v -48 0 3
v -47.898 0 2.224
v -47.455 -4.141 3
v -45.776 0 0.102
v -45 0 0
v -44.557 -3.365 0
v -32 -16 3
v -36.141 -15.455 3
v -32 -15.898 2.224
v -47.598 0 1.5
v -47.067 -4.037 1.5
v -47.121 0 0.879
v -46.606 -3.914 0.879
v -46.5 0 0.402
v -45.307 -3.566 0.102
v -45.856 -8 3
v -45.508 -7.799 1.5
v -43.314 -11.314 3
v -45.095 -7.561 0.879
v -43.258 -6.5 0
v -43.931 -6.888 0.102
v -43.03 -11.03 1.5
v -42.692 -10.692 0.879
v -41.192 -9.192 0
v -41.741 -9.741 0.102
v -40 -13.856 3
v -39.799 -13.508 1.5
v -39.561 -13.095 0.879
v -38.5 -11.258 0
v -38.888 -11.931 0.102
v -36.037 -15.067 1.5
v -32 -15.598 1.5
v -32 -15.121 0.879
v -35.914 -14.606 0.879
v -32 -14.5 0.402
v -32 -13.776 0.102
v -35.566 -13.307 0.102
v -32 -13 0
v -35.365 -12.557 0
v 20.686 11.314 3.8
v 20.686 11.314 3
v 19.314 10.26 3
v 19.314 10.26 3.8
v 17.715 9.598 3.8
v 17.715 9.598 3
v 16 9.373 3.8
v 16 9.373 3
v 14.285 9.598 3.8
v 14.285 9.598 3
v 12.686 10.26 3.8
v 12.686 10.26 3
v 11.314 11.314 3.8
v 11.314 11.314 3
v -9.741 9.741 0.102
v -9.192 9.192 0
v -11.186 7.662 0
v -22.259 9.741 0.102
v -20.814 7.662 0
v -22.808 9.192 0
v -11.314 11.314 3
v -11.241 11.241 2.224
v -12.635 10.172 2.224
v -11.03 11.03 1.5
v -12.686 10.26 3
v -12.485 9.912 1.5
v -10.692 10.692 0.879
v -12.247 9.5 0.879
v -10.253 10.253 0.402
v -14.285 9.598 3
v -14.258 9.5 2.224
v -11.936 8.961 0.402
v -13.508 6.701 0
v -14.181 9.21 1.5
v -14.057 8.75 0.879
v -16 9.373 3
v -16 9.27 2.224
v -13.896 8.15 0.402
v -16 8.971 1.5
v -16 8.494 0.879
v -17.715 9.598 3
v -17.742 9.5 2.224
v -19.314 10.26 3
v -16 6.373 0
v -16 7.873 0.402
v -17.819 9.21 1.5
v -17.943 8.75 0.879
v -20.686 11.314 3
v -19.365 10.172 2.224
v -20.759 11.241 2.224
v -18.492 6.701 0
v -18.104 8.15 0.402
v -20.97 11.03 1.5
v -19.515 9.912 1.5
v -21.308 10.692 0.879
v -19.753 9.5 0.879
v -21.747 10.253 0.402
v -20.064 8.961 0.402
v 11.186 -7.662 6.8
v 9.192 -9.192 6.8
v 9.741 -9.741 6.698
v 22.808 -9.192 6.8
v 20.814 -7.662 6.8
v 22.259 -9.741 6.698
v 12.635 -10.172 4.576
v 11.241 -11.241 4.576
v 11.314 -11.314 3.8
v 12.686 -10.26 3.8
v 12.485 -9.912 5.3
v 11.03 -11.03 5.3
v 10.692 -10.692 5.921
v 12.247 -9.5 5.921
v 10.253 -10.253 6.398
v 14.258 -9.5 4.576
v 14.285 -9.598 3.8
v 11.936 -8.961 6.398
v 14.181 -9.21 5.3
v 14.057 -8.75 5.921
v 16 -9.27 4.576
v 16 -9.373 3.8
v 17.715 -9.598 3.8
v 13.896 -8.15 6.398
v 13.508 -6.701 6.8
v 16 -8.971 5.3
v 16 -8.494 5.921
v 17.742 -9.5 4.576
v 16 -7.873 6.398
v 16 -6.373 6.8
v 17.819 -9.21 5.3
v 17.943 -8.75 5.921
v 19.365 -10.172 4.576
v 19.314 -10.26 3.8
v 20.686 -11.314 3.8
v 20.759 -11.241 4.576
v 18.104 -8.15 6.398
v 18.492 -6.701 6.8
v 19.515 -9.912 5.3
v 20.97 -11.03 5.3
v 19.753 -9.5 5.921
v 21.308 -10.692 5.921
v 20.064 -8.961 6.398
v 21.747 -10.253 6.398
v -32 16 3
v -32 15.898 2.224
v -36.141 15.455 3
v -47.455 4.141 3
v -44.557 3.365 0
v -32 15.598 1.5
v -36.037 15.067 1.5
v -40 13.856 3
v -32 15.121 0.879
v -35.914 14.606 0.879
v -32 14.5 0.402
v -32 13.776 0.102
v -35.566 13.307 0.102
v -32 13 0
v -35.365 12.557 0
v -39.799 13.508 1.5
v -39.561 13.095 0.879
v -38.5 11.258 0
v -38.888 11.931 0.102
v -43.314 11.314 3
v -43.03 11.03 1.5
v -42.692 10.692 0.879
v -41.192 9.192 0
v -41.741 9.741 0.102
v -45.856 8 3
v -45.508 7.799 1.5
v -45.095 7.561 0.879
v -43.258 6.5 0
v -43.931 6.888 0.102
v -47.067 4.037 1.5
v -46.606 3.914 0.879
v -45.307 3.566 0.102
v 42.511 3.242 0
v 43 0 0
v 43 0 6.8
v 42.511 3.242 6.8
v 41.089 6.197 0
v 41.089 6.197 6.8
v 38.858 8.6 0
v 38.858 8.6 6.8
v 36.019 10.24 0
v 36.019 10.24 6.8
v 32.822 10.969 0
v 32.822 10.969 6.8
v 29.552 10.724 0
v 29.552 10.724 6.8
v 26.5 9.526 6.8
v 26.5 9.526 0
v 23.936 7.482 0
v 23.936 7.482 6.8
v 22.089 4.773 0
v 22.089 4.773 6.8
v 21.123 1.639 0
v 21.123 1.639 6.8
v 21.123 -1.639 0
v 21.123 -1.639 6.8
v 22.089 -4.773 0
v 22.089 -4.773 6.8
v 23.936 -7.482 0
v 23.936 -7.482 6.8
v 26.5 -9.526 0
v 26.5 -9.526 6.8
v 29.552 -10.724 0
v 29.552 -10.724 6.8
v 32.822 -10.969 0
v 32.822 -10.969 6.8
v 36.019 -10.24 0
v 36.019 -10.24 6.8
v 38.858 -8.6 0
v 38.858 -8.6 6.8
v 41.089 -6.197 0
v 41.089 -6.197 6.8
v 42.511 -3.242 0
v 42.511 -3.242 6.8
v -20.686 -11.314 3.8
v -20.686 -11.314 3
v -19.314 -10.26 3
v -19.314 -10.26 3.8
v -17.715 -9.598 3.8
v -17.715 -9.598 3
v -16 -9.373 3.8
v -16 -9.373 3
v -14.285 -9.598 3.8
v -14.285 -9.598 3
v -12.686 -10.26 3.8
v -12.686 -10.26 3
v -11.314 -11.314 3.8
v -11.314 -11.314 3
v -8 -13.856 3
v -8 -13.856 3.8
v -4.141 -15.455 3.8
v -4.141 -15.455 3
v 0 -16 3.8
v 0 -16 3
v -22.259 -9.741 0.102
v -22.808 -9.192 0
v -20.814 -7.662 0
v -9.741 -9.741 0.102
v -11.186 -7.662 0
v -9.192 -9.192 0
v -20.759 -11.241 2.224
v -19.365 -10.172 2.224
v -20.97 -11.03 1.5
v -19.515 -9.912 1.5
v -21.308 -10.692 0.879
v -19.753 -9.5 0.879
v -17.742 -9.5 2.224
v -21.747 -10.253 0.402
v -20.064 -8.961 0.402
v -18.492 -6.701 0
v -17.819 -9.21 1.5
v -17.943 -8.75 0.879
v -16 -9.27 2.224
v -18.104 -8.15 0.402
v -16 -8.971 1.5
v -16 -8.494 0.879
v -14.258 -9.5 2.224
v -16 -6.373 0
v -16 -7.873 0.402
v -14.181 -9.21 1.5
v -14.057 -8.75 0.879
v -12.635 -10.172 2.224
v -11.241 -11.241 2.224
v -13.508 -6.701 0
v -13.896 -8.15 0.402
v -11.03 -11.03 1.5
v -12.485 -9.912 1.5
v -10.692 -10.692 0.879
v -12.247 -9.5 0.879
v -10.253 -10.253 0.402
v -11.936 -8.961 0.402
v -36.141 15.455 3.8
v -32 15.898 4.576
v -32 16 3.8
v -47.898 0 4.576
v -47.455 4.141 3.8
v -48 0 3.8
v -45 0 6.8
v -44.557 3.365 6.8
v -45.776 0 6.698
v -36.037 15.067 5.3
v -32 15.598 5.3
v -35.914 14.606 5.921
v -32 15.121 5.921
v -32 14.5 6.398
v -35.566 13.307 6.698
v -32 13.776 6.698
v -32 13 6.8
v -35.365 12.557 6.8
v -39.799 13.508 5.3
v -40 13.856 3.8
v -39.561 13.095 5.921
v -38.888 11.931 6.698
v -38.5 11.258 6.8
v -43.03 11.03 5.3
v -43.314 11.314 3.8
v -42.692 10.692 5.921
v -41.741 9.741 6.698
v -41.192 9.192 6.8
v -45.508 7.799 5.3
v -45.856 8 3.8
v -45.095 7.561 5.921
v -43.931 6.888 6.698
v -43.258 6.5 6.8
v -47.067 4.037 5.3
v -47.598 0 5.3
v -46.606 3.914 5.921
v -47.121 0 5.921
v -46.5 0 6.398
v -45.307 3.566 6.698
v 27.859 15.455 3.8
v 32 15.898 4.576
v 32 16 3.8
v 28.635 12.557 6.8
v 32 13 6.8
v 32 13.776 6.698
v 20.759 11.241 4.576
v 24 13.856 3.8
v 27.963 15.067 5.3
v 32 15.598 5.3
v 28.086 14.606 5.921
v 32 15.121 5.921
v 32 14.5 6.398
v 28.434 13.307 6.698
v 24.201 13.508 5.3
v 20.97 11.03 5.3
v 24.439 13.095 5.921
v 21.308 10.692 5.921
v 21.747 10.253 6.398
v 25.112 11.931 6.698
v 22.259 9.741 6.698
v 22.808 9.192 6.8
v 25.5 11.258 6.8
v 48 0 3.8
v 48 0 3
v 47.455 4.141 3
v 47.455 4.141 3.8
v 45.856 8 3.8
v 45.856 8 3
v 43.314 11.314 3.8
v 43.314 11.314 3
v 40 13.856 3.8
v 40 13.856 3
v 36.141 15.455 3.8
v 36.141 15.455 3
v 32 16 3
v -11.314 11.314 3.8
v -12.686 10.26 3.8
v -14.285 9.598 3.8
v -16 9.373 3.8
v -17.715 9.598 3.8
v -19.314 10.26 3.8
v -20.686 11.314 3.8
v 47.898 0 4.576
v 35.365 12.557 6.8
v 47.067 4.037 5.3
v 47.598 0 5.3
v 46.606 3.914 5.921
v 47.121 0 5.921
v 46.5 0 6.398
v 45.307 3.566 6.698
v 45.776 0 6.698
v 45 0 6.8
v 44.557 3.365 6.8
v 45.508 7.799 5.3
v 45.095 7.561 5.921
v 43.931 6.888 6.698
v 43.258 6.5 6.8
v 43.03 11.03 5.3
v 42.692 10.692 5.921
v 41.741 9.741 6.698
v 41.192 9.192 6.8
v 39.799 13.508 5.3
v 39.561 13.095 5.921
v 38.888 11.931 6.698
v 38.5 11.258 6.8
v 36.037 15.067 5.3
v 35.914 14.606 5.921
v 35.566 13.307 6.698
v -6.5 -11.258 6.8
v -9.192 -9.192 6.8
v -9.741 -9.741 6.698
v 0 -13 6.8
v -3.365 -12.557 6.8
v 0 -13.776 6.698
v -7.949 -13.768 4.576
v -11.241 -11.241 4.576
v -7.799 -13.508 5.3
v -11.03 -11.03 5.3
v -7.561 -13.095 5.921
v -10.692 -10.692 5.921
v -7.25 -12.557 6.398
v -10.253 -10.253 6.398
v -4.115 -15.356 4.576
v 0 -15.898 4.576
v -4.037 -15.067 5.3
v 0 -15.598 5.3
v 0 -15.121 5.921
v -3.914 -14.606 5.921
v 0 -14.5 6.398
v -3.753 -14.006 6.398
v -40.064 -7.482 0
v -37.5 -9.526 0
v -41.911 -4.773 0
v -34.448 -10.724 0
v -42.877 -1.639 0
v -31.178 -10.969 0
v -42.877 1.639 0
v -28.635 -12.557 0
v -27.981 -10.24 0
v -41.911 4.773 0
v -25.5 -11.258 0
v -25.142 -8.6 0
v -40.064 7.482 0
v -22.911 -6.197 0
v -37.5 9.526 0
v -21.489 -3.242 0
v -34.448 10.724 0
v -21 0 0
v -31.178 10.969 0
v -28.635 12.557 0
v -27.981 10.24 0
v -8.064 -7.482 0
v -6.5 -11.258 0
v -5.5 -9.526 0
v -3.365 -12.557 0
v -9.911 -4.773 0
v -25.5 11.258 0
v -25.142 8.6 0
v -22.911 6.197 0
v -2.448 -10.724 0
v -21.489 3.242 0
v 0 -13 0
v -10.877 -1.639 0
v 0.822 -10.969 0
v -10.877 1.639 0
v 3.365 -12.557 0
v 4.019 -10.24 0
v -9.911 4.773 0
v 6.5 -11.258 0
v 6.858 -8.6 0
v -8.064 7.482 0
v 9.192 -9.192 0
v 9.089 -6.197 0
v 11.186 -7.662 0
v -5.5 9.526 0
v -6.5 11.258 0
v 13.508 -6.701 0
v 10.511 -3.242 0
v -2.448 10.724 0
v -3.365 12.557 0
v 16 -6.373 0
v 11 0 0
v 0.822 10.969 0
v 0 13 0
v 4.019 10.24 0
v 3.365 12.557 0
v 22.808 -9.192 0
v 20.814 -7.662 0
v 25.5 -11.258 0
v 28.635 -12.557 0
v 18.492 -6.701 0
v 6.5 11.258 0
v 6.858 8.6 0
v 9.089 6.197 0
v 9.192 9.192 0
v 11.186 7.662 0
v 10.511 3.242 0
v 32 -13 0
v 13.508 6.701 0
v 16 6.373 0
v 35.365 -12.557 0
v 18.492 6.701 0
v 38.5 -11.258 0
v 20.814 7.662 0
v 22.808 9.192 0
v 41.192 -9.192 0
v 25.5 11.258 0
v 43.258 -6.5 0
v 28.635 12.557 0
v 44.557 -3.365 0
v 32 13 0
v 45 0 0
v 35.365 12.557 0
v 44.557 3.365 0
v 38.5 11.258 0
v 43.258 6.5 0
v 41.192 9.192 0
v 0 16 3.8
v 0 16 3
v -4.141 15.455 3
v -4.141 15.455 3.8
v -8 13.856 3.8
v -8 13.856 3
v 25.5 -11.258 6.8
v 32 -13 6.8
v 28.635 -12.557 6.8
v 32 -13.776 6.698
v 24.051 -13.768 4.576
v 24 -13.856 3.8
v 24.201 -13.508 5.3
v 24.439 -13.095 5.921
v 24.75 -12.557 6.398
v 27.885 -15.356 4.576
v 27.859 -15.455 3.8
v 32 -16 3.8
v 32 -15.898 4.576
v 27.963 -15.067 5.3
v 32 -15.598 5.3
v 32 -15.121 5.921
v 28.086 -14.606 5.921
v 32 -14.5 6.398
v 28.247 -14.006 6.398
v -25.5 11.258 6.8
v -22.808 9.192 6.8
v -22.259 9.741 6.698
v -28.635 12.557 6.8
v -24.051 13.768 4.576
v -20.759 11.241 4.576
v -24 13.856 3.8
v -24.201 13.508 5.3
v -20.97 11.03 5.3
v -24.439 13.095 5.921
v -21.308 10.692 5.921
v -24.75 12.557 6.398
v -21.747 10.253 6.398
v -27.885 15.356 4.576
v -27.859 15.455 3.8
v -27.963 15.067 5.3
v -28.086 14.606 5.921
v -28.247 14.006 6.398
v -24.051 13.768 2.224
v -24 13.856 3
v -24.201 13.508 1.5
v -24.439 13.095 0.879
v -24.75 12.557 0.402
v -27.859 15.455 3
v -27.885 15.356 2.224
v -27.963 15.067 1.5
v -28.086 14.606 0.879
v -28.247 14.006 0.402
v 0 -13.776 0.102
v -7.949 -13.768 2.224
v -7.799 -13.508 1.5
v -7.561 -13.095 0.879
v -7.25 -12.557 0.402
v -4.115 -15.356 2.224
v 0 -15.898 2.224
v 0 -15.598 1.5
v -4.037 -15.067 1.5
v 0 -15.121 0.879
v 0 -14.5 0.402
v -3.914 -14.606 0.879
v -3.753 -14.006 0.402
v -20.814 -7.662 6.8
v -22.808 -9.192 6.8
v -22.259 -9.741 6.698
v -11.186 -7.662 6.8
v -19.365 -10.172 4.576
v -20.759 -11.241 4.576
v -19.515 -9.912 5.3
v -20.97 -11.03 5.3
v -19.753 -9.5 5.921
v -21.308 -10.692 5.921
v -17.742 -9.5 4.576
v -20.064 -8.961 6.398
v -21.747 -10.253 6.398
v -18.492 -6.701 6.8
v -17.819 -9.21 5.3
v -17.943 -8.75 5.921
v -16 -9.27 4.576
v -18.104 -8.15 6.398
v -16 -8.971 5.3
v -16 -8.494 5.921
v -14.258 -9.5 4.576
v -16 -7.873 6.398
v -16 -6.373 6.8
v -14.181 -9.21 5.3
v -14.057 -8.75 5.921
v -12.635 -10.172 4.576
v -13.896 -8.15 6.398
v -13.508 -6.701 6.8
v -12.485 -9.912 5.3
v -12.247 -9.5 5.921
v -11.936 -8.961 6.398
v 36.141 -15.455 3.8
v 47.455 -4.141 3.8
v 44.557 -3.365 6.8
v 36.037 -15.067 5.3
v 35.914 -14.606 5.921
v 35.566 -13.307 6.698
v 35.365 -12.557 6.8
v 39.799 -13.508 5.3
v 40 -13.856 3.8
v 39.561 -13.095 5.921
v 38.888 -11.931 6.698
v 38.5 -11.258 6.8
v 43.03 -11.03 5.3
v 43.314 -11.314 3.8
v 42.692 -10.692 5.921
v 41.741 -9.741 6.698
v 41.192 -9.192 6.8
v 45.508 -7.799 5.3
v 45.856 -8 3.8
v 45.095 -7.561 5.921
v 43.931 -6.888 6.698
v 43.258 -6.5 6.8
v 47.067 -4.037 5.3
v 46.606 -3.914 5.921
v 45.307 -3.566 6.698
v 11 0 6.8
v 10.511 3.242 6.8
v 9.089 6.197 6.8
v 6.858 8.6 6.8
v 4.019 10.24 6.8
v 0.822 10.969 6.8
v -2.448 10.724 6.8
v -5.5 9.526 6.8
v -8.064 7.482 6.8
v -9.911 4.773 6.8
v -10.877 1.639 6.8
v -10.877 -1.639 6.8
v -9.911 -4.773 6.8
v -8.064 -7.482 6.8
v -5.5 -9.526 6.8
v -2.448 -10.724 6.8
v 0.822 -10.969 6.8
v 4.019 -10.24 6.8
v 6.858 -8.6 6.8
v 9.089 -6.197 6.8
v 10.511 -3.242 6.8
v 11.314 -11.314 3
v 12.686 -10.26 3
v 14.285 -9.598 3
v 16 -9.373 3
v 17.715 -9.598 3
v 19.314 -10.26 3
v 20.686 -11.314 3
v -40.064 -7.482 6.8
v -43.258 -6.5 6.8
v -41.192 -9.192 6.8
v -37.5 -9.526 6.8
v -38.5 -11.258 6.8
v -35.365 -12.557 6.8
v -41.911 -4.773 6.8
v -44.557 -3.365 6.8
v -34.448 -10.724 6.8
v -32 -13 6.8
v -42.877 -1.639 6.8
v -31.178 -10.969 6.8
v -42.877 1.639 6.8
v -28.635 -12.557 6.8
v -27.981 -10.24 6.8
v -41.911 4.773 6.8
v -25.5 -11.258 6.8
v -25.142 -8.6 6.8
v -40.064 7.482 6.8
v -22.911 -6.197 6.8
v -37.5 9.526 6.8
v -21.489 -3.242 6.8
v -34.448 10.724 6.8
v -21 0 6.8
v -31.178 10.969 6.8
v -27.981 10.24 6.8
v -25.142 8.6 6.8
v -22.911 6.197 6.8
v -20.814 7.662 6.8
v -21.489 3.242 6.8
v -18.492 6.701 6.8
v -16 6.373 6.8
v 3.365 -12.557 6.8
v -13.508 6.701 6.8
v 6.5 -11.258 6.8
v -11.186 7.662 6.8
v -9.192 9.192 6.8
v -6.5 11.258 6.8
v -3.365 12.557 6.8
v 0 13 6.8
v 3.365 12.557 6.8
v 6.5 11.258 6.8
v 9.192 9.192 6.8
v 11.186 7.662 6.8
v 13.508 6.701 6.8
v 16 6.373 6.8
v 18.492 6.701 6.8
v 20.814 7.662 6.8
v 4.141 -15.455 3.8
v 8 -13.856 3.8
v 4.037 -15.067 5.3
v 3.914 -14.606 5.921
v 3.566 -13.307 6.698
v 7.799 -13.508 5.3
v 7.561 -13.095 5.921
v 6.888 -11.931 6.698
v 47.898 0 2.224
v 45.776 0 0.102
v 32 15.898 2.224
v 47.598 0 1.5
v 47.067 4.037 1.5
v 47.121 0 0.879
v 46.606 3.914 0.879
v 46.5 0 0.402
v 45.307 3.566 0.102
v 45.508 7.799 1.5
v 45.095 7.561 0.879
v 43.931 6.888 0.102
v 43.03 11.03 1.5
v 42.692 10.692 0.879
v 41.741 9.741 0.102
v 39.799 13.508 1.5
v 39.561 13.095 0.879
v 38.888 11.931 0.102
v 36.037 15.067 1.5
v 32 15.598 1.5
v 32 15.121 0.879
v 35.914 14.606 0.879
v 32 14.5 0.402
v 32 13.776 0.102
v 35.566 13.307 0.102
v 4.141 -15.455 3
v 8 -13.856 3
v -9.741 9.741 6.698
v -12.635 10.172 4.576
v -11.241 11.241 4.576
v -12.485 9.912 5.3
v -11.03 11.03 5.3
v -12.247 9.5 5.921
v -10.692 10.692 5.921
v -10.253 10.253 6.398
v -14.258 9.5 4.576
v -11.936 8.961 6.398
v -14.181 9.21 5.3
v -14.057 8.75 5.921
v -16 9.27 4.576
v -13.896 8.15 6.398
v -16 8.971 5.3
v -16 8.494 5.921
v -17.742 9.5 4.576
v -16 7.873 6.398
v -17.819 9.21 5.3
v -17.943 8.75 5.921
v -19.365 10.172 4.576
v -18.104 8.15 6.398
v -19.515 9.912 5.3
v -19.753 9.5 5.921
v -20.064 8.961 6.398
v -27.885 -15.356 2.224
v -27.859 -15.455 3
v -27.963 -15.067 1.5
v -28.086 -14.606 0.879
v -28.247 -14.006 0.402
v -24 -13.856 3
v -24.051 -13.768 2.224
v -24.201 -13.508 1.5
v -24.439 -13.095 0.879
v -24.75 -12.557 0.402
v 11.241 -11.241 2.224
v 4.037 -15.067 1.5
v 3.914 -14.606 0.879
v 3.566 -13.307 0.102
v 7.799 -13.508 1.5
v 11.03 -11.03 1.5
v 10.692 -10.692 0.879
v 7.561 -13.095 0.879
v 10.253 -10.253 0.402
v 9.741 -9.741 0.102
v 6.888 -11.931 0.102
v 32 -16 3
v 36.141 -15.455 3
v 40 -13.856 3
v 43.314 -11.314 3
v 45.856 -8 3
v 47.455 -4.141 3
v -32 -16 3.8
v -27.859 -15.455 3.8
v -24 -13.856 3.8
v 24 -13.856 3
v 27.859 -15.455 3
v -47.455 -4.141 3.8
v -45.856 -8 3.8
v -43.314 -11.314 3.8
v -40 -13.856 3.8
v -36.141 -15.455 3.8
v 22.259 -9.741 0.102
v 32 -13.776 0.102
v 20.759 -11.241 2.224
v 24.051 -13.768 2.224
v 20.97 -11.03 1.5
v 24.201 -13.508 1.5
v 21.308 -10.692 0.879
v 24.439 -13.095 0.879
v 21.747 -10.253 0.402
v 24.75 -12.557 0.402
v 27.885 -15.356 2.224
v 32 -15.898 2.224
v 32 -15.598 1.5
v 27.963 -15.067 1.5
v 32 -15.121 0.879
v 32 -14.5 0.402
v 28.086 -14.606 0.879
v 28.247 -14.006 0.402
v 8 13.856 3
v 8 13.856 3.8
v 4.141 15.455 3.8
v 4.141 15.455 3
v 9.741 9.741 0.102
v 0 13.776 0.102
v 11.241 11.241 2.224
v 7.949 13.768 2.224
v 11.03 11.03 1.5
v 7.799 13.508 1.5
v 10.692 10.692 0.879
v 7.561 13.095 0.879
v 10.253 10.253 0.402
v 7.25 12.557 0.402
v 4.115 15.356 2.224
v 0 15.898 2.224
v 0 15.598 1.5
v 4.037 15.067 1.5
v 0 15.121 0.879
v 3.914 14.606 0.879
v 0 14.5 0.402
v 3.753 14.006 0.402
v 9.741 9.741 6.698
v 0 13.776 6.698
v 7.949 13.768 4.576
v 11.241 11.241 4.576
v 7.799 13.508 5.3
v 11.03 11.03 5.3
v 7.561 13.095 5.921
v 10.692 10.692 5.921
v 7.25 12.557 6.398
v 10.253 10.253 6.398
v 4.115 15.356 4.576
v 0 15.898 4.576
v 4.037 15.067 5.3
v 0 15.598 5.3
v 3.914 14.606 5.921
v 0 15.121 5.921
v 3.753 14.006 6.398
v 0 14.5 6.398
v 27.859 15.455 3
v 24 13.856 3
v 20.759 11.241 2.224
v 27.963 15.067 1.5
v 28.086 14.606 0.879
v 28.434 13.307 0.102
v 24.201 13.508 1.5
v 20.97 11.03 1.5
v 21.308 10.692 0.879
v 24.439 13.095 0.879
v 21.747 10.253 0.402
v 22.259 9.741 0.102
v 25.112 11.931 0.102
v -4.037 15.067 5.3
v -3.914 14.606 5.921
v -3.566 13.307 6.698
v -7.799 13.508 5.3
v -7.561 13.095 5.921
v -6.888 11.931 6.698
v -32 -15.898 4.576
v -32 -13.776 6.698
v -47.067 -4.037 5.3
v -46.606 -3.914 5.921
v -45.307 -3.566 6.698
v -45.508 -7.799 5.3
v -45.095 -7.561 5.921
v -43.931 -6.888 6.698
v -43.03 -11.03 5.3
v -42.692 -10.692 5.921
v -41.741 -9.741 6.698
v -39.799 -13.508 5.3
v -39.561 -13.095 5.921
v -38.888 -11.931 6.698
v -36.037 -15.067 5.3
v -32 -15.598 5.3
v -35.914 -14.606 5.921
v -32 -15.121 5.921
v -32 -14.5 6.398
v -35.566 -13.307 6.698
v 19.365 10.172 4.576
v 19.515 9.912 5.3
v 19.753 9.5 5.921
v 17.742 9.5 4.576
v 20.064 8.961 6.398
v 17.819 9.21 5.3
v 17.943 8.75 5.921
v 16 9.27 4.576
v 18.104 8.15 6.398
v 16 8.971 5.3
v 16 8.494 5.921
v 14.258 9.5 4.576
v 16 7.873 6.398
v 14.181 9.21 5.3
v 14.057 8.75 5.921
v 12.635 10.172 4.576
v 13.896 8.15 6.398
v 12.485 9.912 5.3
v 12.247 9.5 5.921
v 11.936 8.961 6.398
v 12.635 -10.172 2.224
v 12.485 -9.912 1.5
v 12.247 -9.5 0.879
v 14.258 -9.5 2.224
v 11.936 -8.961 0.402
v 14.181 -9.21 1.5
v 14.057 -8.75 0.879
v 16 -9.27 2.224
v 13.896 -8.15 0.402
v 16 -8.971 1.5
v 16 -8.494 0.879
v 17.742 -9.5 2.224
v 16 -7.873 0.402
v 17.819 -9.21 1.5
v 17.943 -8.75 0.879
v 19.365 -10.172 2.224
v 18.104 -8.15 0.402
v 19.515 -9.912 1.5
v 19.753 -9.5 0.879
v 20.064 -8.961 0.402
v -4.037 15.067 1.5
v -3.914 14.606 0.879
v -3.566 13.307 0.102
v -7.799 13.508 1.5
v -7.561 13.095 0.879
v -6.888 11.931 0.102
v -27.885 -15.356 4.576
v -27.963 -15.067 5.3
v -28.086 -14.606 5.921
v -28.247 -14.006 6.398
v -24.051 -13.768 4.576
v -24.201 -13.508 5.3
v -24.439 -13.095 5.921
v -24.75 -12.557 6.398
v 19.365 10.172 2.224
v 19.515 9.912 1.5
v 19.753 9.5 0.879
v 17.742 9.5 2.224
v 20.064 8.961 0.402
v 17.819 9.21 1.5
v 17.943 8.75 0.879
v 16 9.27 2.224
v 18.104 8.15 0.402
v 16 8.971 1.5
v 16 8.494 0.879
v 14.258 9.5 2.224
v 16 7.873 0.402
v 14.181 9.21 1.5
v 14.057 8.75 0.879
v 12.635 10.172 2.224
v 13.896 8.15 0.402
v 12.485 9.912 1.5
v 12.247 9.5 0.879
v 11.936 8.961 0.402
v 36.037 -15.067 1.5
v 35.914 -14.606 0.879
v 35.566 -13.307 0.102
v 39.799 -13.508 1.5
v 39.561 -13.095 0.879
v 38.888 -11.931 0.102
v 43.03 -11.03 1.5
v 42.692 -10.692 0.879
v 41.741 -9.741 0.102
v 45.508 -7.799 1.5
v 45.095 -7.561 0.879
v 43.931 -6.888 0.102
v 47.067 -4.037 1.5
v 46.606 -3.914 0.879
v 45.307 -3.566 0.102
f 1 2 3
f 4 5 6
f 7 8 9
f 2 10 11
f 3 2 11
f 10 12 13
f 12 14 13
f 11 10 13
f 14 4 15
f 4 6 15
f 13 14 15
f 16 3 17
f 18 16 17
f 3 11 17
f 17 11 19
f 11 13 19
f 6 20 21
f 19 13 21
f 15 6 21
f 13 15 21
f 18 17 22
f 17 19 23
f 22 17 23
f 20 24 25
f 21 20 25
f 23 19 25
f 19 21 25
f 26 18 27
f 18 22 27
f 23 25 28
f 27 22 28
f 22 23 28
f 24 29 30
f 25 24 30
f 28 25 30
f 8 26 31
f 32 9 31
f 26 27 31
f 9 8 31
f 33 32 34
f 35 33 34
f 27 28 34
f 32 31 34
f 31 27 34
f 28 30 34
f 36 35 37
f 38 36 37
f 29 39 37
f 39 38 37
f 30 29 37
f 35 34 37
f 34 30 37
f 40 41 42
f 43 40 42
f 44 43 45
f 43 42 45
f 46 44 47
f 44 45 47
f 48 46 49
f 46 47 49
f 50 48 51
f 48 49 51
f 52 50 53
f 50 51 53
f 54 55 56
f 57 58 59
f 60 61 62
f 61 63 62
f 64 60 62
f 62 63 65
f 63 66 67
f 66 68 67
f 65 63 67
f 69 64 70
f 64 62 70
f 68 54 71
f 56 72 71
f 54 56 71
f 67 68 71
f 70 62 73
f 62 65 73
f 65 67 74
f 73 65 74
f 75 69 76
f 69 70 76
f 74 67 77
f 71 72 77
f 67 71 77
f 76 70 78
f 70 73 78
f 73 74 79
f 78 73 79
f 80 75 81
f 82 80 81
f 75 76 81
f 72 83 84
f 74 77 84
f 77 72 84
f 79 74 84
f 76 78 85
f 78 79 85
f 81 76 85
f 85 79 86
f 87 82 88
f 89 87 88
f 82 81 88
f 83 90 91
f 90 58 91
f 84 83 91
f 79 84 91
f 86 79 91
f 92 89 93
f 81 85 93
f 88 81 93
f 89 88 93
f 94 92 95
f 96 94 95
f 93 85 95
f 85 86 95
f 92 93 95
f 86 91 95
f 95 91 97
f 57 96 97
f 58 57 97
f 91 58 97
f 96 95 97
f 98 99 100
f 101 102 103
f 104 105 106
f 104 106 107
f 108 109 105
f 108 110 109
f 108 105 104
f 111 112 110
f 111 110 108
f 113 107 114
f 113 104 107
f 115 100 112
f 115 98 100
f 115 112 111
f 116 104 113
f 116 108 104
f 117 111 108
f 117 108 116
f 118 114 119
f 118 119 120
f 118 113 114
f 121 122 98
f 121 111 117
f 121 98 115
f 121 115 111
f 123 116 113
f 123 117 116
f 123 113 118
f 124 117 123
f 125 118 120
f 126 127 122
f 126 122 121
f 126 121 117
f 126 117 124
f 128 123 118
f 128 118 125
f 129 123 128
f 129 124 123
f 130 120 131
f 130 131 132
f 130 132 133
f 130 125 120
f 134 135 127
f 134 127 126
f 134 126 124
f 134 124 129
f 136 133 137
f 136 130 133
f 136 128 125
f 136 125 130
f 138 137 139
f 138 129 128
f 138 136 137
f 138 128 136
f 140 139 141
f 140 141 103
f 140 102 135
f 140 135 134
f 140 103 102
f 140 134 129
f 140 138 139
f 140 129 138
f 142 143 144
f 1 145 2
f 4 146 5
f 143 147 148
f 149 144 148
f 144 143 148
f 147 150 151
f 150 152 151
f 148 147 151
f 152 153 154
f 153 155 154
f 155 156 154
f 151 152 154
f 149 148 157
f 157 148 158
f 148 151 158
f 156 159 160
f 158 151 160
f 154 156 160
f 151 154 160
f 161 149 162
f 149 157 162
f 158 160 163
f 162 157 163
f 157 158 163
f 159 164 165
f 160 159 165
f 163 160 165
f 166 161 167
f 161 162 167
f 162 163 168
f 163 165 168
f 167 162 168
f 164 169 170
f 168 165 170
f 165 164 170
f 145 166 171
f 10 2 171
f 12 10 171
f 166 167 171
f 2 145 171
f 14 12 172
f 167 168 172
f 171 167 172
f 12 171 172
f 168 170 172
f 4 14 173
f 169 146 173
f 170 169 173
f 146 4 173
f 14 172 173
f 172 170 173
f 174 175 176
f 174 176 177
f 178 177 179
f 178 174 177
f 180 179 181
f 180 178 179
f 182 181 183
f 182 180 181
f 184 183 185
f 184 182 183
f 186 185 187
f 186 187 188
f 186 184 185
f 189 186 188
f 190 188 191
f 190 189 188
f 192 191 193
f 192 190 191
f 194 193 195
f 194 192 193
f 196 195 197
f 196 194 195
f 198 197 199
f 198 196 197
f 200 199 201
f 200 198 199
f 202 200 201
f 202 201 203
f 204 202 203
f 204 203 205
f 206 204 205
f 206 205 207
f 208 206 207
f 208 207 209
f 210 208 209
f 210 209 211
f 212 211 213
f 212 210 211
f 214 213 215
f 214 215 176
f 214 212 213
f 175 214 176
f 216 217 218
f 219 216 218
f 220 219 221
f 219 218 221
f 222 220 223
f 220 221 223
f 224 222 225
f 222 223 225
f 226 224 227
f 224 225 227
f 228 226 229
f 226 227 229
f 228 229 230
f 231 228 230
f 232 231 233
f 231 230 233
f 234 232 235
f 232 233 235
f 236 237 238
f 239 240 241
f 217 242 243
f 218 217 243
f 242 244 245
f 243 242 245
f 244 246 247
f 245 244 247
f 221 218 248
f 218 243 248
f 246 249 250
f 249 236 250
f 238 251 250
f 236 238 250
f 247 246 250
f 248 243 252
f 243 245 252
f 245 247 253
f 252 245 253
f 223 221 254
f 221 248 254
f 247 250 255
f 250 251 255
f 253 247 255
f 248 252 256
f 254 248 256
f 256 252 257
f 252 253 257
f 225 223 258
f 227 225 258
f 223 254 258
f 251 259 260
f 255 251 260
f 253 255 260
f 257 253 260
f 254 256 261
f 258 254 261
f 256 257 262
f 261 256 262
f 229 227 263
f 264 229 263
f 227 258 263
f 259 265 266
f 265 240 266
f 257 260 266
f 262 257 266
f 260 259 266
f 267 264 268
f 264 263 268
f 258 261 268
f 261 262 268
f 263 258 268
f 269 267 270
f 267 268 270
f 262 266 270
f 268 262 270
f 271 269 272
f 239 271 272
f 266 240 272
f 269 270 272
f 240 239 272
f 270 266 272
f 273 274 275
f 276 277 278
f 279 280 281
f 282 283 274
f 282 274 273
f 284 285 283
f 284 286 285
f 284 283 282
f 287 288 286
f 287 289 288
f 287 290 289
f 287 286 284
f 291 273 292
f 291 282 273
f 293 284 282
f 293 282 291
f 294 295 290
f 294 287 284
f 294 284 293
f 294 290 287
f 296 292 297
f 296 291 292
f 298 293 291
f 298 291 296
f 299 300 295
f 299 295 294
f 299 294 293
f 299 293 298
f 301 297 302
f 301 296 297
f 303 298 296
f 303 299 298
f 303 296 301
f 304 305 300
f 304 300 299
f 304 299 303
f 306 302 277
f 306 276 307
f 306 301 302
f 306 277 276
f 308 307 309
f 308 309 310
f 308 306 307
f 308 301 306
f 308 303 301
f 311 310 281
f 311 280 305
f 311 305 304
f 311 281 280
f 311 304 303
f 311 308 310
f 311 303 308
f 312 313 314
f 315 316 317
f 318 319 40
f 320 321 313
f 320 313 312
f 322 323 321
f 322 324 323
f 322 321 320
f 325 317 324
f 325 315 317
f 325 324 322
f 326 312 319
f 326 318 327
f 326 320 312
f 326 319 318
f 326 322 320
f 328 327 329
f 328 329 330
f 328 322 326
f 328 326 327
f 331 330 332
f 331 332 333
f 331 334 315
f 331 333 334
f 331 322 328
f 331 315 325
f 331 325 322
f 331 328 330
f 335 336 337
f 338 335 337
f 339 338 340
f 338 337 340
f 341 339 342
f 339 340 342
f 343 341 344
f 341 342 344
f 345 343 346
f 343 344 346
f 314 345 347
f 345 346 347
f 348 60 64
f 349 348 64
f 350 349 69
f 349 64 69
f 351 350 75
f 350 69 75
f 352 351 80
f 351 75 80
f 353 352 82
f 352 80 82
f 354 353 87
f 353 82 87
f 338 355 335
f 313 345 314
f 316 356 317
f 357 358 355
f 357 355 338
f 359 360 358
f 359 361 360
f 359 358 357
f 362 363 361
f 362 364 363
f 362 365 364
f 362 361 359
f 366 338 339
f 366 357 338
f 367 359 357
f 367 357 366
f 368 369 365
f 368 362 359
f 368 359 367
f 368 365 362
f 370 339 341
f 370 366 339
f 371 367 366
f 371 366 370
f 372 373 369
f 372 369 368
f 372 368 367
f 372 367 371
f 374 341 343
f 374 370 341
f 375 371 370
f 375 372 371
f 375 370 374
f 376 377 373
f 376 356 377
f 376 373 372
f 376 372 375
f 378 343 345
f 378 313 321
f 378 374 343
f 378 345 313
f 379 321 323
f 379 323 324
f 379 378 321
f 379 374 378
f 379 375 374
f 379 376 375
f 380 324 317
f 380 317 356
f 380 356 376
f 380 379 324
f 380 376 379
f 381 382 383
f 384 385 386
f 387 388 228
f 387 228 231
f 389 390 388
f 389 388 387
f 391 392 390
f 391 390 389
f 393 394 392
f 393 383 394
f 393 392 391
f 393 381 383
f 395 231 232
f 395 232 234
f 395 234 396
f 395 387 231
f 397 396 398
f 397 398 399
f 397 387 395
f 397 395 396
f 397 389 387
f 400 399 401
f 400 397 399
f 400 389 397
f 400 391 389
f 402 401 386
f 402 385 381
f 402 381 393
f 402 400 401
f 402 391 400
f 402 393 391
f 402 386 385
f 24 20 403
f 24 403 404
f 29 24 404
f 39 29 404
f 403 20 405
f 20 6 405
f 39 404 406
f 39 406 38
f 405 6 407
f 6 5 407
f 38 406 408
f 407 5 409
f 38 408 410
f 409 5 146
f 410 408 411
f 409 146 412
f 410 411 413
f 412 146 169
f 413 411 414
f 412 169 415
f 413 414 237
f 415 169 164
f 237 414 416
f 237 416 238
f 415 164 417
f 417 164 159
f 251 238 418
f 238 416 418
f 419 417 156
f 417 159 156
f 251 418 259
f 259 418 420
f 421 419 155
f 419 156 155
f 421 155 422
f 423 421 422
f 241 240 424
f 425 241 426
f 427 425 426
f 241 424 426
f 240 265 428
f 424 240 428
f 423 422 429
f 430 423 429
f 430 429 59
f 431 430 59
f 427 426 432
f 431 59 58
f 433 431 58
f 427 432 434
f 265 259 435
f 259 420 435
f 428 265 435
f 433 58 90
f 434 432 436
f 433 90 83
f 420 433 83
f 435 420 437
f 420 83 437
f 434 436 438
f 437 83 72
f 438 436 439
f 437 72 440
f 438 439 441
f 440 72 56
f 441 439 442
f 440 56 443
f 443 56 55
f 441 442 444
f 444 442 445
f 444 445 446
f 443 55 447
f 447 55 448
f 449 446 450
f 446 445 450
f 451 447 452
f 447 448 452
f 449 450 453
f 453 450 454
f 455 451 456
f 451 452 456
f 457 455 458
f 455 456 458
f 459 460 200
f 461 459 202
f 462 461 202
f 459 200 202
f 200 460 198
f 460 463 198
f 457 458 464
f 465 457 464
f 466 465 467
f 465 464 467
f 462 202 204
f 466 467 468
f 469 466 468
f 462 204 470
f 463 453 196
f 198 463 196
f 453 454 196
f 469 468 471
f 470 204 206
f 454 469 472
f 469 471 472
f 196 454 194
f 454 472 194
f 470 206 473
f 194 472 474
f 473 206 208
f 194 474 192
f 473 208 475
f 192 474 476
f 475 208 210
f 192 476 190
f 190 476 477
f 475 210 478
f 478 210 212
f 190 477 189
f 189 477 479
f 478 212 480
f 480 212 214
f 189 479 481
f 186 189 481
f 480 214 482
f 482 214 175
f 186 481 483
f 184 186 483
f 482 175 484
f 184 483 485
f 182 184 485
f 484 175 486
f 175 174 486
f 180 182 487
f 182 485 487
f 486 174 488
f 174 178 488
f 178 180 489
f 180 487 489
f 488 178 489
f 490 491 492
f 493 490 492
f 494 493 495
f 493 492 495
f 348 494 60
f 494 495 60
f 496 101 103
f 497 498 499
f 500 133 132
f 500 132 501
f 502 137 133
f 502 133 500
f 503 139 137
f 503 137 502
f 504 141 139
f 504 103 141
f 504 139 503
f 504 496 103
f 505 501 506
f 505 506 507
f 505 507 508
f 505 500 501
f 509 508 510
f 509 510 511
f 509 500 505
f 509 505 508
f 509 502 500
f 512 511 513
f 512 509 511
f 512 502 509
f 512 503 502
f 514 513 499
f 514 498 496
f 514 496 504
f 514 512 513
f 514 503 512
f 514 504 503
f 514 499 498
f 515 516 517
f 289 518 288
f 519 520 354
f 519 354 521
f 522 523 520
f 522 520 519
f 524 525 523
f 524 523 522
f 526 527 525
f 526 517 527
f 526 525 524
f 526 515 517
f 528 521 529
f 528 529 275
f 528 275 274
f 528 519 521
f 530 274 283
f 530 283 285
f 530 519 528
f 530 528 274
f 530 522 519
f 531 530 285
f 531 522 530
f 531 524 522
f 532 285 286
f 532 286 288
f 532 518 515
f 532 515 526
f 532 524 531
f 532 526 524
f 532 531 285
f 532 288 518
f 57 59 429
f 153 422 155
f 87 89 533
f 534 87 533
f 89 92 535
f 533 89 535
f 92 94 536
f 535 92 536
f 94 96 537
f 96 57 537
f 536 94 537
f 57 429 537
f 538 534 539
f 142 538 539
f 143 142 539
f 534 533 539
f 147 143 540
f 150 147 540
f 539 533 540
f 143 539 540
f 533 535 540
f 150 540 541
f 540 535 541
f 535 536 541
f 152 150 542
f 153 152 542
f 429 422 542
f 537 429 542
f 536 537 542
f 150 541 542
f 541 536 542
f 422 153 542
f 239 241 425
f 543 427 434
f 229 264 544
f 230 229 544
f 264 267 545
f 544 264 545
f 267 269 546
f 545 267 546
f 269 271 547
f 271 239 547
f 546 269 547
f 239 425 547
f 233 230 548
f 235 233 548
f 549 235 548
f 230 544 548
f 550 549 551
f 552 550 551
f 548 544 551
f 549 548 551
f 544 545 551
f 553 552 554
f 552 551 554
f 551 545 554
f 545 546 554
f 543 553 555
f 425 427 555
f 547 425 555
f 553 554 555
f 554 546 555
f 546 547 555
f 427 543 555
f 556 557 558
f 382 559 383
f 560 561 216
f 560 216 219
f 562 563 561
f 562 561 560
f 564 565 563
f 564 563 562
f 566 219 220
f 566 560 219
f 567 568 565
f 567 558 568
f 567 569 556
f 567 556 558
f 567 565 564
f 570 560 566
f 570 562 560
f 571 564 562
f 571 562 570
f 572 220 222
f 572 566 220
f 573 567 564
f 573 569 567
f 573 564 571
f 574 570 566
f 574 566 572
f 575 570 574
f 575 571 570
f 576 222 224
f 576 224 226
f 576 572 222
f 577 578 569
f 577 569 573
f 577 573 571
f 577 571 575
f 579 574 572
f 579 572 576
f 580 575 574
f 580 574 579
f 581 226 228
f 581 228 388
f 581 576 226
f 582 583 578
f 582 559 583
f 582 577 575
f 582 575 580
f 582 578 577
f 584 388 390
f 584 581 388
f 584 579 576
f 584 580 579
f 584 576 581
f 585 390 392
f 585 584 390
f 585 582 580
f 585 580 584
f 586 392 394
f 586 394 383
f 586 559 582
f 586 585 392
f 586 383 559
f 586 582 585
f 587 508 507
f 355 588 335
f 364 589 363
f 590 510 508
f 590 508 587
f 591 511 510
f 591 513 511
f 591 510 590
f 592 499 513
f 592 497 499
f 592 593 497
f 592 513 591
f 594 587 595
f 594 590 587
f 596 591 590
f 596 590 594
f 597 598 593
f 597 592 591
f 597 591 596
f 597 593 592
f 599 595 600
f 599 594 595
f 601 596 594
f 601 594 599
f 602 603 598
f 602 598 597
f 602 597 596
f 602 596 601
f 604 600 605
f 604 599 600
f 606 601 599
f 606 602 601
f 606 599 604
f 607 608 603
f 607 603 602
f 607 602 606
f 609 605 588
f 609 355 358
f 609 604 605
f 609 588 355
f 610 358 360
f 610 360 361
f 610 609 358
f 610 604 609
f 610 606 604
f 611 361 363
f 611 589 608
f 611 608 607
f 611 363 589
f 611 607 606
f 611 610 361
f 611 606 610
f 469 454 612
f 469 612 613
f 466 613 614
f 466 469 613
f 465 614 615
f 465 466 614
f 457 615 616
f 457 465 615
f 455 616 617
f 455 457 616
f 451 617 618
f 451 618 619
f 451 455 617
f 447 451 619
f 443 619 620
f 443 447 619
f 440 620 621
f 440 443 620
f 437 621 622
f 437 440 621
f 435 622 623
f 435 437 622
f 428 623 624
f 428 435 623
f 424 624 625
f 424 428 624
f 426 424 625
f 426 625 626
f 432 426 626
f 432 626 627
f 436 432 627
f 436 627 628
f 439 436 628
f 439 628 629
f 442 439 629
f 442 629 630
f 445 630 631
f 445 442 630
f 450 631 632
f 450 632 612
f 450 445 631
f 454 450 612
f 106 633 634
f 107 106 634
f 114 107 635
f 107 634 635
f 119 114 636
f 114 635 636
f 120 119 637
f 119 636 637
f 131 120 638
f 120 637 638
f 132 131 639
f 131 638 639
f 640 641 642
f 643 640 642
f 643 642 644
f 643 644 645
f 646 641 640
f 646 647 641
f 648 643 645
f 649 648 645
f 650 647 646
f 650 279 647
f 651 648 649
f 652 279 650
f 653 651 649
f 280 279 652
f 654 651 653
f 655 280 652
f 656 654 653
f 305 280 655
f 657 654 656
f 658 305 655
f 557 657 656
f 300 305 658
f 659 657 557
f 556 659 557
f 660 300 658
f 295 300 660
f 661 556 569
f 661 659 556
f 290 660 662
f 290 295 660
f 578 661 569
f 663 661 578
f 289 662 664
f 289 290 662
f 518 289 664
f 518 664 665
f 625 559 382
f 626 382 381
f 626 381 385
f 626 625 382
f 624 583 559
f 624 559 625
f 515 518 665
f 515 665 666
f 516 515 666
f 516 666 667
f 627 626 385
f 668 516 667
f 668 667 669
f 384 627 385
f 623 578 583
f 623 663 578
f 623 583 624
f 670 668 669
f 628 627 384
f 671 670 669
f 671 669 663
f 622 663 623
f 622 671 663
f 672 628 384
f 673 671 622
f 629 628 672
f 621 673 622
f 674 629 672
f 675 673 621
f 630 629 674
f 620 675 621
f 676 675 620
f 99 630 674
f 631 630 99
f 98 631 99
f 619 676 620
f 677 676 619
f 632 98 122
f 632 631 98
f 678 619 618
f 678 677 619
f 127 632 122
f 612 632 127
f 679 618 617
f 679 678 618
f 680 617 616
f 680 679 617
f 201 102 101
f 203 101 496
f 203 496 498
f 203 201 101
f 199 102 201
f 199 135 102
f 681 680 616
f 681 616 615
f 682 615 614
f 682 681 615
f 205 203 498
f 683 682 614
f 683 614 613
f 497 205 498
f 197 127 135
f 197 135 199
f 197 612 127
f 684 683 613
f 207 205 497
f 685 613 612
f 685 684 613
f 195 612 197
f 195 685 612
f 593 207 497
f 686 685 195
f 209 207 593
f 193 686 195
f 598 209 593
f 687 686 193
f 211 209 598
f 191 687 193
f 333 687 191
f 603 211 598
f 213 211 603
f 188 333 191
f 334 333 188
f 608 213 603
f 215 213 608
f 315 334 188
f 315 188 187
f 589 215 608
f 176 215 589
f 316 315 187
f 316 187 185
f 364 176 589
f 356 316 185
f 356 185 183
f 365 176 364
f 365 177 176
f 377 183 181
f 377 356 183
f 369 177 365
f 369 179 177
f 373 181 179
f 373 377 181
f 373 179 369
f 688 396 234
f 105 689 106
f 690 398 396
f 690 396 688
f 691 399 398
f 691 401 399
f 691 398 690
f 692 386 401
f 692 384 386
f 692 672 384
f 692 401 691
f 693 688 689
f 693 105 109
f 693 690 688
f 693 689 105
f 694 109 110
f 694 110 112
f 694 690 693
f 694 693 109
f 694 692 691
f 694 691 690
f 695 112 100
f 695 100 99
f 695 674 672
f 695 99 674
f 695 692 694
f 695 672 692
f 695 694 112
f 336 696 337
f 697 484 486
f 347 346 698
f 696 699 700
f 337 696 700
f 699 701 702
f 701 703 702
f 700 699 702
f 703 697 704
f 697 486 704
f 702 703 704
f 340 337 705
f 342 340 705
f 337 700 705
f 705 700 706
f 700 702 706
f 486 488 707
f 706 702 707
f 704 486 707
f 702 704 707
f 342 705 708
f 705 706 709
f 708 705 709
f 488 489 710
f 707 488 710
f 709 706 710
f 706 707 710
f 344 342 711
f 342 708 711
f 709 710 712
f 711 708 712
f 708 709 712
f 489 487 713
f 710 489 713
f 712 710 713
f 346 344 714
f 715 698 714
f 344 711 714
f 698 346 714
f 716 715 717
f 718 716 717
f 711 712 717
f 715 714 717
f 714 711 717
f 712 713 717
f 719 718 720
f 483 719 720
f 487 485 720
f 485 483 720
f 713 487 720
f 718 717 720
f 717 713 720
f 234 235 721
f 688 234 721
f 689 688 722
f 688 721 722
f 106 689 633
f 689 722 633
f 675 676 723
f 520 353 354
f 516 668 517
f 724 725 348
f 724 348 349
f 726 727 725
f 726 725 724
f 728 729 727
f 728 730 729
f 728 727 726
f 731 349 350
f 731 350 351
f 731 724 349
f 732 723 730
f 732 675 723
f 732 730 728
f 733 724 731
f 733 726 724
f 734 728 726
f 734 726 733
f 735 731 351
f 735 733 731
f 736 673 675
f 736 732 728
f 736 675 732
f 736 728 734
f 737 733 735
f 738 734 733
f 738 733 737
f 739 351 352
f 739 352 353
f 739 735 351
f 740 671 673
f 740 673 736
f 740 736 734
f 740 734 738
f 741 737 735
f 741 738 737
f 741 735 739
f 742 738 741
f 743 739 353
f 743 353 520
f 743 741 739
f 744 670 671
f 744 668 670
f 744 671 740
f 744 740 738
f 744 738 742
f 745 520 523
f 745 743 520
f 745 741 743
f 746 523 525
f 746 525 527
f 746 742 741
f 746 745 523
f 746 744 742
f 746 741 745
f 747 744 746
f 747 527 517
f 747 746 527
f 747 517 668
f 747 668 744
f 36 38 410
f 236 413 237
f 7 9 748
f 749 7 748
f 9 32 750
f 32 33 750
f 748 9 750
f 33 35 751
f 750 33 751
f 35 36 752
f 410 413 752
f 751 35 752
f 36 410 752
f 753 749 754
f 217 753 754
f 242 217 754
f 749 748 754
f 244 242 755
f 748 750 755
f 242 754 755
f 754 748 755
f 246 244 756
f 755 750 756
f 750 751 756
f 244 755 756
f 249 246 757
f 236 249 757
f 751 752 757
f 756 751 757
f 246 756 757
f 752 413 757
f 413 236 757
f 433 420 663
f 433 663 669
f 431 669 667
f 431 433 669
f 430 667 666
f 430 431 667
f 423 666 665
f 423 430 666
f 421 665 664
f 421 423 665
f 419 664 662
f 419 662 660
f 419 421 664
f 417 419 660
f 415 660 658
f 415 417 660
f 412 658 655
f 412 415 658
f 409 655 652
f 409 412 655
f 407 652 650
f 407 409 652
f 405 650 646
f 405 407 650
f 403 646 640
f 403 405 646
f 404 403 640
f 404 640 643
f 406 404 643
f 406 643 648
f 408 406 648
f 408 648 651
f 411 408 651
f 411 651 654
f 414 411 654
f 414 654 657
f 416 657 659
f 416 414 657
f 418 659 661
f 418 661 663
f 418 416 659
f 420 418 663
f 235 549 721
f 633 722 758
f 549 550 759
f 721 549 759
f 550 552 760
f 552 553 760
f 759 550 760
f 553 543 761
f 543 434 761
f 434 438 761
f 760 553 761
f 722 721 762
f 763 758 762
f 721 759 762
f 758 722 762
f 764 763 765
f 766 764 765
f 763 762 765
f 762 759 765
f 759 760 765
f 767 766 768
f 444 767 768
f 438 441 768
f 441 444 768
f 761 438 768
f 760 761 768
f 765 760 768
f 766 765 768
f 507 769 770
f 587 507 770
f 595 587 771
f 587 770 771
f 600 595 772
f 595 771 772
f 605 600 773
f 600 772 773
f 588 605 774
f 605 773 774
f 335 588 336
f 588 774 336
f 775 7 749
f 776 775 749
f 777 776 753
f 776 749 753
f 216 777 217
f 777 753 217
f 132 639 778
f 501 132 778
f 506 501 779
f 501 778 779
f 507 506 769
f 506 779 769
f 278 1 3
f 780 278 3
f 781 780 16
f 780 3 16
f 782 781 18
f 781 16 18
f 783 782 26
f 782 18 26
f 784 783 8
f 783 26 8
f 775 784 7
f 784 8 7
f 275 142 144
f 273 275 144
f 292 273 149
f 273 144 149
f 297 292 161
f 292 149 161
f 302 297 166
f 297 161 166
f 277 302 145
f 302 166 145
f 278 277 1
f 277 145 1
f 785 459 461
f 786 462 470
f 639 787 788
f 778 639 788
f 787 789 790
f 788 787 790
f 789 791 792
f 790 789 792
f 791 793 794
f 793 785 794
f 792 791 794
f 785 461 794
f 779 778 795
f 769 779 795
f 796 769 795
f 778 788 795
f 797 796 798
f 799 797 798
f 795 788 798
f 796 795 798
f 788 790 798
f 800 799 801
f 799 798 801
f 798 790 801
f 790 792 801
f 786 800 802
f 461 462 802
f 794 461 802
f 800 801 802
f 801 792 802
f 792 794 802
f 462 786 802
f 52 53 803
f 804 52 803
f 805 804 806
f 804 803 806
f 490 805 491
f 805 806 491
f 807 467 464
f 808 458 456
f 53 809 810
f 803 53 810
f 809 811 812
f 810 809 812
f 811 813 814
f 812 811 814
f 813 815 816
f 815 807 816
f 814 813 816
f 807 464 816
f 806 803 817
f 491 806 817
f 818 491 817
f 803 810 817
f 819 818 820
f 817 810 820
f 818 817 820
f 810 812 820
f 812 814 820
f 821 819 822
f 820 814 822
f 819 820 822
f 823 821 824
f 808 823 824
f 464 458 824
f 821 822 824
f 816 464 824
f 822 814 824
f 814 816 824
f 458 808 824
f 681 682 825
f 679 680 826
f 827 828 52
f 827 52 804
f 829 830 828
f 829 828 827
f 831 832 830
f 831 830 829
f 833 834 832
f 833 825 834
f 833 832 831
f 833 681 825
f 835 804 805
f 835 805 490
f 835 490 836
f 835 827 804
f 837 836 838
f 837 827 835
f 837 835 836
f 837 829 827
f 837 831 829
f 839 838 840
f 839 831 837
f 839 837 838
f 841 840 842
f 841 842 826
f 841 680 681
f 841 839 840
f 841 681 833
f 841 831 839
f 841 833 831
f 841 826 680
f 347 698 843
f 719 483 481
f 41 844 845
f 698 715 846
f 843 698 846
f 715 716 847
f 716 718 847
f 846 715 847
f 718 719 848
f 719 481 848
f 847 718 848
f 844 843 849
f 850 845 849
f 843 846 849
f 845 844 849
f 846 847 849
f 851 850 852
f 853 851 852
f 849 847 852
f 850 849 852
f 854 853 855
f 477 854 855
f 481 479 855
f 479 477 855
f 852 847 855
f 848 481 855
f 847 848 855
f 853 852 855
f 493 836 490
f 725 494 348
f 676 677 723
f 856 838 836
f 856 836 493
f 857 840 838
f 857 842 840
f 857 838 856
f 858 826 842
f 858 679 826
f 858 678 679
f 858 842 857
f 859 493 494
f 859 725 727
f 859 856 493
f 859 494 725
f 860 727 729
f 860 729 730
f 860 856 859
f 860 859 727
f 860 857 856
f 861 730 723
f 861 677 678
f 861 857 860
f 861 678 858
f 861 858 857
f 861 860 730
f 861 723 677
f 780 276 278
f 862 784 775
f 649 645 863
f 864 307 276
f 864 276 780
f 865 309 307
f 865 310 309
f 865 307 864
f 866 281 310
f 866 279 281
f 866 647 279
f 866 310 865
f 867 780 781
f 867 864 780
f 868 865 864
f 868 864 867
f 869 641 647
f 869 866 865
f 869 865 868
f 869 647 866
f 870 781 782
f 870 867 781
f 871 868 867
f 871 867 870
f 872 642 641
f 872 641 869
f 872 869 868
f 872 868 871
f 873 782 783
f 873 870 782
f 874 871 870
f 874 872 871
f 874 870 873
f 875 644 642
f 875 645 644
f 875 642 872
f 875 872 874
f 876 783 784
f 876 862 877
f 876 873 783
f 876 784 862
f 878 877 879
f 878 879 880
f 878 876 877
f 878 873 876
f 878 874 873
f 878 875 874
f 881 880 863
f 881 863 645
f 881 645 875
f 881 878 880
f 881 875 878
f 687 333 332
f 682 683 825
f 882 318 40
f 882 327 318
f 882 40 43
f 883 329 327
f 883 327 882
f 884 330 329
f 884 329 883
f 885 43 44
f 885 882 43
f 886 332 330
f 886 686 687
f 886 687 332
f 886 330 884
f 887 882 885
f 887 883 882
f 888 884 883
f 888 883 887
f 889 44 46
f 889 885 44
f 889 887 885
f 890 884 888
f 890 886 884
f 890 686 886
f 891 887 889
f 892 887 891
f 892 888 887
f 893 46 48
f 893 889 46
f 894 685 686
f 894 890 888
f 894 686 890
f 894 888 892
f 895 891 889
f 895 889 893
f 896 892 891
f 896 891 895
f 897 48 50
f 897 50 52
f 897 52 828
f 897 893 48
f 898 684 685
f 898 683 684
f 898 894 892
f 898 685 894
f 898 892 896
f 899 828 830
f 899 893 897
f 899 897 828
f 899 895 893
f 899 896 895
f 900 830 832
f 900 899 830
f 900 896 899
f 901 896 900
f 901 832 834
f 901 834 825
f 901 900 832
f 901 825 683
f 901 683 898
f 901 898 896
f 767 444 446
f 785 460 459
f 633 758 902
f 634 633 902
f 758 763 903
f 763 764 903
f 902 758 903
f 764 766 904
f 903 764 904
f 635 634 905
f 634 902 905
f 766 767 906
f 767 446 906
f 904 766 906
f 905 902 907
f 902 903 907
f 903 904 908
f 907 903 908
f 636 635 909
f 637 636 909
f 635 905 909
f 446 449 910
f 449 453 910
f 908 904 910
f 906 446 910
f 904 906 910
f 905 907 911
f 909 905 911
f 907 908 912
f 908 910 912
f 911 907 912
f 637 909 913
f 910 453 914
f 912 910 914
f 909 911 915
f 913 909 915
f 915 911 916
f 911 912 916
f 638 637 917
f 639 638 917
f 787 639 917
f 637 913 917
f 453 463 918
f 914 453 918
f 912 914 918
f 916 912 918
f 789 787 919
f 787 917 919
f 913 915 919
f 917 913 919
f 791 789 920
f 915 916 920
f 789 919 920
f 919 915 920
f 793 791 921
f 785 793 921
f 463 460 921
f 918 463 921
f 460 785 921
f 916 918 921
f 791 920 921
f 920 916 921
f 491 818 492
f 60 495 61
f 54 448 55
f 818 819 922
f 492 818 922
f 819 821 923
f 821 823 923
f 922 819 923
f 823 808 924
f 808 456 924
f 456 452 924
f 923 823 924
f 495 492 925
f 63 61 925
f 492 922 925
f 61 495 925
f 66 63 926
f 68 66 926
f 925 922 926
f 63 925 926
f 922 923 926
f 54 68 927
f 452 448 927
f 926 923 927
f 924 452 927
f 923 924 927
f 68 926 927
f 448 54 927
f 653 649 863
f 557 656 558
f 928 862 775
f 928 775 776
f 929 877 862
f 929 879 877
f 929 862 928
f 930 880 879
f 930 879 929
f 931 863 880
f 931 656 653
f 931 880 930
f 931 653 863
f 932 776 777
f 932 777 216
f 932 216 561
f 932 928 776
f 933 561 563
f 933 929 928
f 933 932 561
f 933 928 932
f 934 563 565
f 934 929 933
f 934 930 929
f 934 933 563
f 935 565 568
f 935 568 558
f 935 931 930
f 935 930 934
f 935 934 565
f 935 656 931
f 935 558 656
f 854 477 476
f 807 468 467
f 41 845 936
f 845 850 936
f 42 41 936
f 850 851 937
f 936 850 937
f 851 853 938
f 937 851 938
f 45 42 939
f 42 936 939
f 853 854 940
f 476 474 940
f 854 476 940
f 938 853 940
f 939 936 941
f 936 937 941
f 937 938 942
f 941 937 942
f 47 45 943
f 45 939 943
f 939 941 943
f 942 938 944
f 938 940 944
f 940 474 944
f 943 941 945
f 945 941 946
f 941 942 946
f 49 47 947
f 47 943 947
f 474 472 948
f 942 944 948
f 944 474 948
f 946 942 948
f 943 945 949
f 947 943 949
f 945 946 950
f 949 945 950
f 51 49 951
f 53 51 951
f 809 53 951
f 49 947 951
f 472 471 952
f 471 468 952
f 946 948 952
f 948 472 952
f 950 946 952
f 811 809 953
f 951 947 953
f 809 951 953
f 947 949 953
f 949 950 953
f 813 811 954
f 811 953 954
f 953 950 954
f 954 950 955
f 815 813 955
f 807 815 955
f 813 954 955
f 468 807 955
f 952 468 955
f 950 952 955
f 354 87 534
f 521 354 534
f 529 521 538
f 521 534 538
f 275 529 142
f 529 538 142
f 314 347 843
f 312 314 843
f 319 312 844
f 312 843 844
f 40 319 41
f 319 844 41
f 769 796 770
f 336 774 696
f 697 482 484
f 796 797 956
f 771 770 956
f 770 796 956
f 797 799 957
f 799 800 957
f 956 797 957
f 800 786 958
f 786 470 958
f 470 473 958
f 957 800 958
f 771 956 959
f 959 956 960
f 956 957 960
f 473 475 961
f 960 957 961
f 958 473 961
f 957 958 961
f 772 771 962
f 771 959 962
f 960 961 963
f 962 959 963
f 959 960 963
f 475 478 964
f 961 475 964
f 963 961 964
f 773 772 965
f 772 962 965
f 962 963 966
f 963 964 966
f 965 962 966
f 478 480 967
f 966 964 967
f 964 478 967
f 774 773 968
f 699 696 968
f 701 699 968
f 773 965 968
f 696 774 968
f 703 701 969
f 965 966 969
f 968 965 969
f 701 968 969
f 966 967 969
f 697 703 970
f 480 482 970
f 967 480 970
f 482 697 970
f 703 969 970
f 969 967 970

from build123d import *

# Parameters (mm, degrees)
F0_R     = 11
F1_DEPTH = 6.8
F2_R     = 3


with BuildPart() as f1:
    # F0 (on Top) → F1 (new body)
    with BuildSketch(Plane.XY):
        with BuildLine():
            ThreePointArc((-20.686291531, -11.313708529), (-17.2179274879, -6.1229349374), (-16, 0))
            ThreePointArc((-16, 0), (-17.2179274734, 6.1229349024), (-20.6862914774, 11.3137084754))
            ThreePointArc((-20.6862914774, 11.3137084754), (-25.8770650668, 14.7820725138), (-32, 16))
            ThreePointArc((-32, 16), (-43.313708499, 11.313708499), (-48, 0))
            ThreePointArc((-48, 0), (-43.313708499, -11.313708499), (-32, -16))
            ThreePointArc((-32, -16), (-25.8770651018, -14.7820725283), (-20.686291531, -11.313708529))
        make_face()
        with Locations((-32, 0)):
            Circle(F0_R, mode=Mode.SUBTRACT)
        with BuildLine():
            ThreePointArc((11.3137085412, -11.3137084568), (14.7820725316, -6.1229348903), (16, 0))
            ThreePointArc((16, 0), (14.7820725145, 6.1229349315), (11.3137084781, 11.3137085199))
            ThreePointArc((11.3137084781, 11.3137085199), (6.1229349042, 14.7820725258), (0, 16))
            ThreePointArc((0, 16), (-6.1229349134, 14.782072522), (-11.3137084922, 11.3137085058))
            ThreePointArc((-11.3137084922, 11.3137085058), (-14.7820725183, 6.1229349223), (-16, 0))
            ThreePointArc((-16, 0), (-14.7820725202, -6.1229349178), (-11.313708499, -11.313708499))
            ThreePointArc((-11.313708499, -11.313708499), (-6.1229348926, -14.7820725306), (5.46e-08, -16))
            ThreePointArc((5.46e-08, -16), (6.1229349706, -14.7820724983), (11.3137085412, -11.3137084568))
        make_face()
        Circle(F0_R, mode=Mode.SUBTRACT)
        with BuildLine():
            ThreePointArc((20.6862914869, -11.3137084849), (25.877065073, -14.7820725164), (32, -16))
            ThreePointArc((32, -16), (43.313708499, -11.313708499), (48, 0))
            ThreePointArc((48, 0), (43.313708499, 11.313708499), (32, 16))
            ThreePointArc((32, 16), (25.8770650464, 14.7820725054), (20.6862914463, 11.3137084443))
            ThreePointArc((20.6862914463, 11.3137084443), (17.217927465, 6.1229348821), (16, 0))
            ThreePointArc((16, 0), (17.217927476, -6.1229349086), (20.6862914869, -11.3137084849))
        make_face()
        with Locations((32, 0)):
            Circle(F0_R, mode=Mode.SUBTRACT)
        with BuildLine():
            ThreePointArc((11.3137084781, 11.3137085199), (14.7820725145, 6.1229349315), (16, 0))
            ThreePointArc((16, 0), (17.217927465, 6.1229348821), (20.6862914463, 11.3137084443))
            ThreePointArc((20.6862914463, 11.3137084443), (15.9999999466, 9.372583002), (11.3137084781, 11.3137085199))
        make_face()
        with BuildLine():
            ThreePointArc((-20.6862914774, 11.3137084754), (-17.2179274734, 6.1229349024), (-16, 0))
            ThreePointArc((-16, 0), (-14.7820725183, 6.1229349223), (-11.3137084922, 11.3137085058))
            ThreePointArc((-11.3137084922, 11.3137085058), (-15.9999999785, 9.372583002), (-20.6862914774, 11.3137084754))
        make_face()
        with BuildLine():
            ThreePointArc((-20.686291531, -11.313708529), (-16.0000000212, -9.372583002), (-11.313708499, -11.313708499))
            ThreePointArc((-11.313708499, -11.313708499), (-14.7820725202, -6.1229349178), (-16, 0))
            ThreePointArc((-16, 0), (-17.2179274879, -6.1229349374), (-20.686291531, -11.313708529))
        make_face()
        with BuildLine():
            ThreePointArc((11.3137085412, -11.3137084568), (16.0000000199, -9.372583002), (20.6862914869, -11.3137084849))
            ThreePointArc((20.6862914869, -11.3137084849), (17.217927476, -6.1229349086), (16, 0))
            ThreePointArc((16, 0), (14.7820725316, -6.1229348903), (11.3137085412, -11.3137084568))
        make_face()
    extrude(amount=F1_DEPTH)

    # F2
    f2_edges = [f1.edges().sort_by_distance(p)[0] for p in [
        (-48, 0, 6.8),
        (-16, -9.372583, 6.8),
        (0, -16, 6.8),
        (16, -9.372583, 6.8),
        (48, 0, 6.8),
        (-16, 9.372583, 6.8),
        (0, 16, 6.8),
        (16, 9.372583, 6.8),
        (-48, 0, 0),
        (-16, -9.372583, 0),
        (0, -16, 0),
        (16, -9.372583, 0),
        (48, 0, 0),
        (-16, 9.372583, 0),
        (0, 16, 0),
        (16, 9.372583, 0),
    ]]
    fillet(f2_edges, radius=F2_R)


solid = f1.part
